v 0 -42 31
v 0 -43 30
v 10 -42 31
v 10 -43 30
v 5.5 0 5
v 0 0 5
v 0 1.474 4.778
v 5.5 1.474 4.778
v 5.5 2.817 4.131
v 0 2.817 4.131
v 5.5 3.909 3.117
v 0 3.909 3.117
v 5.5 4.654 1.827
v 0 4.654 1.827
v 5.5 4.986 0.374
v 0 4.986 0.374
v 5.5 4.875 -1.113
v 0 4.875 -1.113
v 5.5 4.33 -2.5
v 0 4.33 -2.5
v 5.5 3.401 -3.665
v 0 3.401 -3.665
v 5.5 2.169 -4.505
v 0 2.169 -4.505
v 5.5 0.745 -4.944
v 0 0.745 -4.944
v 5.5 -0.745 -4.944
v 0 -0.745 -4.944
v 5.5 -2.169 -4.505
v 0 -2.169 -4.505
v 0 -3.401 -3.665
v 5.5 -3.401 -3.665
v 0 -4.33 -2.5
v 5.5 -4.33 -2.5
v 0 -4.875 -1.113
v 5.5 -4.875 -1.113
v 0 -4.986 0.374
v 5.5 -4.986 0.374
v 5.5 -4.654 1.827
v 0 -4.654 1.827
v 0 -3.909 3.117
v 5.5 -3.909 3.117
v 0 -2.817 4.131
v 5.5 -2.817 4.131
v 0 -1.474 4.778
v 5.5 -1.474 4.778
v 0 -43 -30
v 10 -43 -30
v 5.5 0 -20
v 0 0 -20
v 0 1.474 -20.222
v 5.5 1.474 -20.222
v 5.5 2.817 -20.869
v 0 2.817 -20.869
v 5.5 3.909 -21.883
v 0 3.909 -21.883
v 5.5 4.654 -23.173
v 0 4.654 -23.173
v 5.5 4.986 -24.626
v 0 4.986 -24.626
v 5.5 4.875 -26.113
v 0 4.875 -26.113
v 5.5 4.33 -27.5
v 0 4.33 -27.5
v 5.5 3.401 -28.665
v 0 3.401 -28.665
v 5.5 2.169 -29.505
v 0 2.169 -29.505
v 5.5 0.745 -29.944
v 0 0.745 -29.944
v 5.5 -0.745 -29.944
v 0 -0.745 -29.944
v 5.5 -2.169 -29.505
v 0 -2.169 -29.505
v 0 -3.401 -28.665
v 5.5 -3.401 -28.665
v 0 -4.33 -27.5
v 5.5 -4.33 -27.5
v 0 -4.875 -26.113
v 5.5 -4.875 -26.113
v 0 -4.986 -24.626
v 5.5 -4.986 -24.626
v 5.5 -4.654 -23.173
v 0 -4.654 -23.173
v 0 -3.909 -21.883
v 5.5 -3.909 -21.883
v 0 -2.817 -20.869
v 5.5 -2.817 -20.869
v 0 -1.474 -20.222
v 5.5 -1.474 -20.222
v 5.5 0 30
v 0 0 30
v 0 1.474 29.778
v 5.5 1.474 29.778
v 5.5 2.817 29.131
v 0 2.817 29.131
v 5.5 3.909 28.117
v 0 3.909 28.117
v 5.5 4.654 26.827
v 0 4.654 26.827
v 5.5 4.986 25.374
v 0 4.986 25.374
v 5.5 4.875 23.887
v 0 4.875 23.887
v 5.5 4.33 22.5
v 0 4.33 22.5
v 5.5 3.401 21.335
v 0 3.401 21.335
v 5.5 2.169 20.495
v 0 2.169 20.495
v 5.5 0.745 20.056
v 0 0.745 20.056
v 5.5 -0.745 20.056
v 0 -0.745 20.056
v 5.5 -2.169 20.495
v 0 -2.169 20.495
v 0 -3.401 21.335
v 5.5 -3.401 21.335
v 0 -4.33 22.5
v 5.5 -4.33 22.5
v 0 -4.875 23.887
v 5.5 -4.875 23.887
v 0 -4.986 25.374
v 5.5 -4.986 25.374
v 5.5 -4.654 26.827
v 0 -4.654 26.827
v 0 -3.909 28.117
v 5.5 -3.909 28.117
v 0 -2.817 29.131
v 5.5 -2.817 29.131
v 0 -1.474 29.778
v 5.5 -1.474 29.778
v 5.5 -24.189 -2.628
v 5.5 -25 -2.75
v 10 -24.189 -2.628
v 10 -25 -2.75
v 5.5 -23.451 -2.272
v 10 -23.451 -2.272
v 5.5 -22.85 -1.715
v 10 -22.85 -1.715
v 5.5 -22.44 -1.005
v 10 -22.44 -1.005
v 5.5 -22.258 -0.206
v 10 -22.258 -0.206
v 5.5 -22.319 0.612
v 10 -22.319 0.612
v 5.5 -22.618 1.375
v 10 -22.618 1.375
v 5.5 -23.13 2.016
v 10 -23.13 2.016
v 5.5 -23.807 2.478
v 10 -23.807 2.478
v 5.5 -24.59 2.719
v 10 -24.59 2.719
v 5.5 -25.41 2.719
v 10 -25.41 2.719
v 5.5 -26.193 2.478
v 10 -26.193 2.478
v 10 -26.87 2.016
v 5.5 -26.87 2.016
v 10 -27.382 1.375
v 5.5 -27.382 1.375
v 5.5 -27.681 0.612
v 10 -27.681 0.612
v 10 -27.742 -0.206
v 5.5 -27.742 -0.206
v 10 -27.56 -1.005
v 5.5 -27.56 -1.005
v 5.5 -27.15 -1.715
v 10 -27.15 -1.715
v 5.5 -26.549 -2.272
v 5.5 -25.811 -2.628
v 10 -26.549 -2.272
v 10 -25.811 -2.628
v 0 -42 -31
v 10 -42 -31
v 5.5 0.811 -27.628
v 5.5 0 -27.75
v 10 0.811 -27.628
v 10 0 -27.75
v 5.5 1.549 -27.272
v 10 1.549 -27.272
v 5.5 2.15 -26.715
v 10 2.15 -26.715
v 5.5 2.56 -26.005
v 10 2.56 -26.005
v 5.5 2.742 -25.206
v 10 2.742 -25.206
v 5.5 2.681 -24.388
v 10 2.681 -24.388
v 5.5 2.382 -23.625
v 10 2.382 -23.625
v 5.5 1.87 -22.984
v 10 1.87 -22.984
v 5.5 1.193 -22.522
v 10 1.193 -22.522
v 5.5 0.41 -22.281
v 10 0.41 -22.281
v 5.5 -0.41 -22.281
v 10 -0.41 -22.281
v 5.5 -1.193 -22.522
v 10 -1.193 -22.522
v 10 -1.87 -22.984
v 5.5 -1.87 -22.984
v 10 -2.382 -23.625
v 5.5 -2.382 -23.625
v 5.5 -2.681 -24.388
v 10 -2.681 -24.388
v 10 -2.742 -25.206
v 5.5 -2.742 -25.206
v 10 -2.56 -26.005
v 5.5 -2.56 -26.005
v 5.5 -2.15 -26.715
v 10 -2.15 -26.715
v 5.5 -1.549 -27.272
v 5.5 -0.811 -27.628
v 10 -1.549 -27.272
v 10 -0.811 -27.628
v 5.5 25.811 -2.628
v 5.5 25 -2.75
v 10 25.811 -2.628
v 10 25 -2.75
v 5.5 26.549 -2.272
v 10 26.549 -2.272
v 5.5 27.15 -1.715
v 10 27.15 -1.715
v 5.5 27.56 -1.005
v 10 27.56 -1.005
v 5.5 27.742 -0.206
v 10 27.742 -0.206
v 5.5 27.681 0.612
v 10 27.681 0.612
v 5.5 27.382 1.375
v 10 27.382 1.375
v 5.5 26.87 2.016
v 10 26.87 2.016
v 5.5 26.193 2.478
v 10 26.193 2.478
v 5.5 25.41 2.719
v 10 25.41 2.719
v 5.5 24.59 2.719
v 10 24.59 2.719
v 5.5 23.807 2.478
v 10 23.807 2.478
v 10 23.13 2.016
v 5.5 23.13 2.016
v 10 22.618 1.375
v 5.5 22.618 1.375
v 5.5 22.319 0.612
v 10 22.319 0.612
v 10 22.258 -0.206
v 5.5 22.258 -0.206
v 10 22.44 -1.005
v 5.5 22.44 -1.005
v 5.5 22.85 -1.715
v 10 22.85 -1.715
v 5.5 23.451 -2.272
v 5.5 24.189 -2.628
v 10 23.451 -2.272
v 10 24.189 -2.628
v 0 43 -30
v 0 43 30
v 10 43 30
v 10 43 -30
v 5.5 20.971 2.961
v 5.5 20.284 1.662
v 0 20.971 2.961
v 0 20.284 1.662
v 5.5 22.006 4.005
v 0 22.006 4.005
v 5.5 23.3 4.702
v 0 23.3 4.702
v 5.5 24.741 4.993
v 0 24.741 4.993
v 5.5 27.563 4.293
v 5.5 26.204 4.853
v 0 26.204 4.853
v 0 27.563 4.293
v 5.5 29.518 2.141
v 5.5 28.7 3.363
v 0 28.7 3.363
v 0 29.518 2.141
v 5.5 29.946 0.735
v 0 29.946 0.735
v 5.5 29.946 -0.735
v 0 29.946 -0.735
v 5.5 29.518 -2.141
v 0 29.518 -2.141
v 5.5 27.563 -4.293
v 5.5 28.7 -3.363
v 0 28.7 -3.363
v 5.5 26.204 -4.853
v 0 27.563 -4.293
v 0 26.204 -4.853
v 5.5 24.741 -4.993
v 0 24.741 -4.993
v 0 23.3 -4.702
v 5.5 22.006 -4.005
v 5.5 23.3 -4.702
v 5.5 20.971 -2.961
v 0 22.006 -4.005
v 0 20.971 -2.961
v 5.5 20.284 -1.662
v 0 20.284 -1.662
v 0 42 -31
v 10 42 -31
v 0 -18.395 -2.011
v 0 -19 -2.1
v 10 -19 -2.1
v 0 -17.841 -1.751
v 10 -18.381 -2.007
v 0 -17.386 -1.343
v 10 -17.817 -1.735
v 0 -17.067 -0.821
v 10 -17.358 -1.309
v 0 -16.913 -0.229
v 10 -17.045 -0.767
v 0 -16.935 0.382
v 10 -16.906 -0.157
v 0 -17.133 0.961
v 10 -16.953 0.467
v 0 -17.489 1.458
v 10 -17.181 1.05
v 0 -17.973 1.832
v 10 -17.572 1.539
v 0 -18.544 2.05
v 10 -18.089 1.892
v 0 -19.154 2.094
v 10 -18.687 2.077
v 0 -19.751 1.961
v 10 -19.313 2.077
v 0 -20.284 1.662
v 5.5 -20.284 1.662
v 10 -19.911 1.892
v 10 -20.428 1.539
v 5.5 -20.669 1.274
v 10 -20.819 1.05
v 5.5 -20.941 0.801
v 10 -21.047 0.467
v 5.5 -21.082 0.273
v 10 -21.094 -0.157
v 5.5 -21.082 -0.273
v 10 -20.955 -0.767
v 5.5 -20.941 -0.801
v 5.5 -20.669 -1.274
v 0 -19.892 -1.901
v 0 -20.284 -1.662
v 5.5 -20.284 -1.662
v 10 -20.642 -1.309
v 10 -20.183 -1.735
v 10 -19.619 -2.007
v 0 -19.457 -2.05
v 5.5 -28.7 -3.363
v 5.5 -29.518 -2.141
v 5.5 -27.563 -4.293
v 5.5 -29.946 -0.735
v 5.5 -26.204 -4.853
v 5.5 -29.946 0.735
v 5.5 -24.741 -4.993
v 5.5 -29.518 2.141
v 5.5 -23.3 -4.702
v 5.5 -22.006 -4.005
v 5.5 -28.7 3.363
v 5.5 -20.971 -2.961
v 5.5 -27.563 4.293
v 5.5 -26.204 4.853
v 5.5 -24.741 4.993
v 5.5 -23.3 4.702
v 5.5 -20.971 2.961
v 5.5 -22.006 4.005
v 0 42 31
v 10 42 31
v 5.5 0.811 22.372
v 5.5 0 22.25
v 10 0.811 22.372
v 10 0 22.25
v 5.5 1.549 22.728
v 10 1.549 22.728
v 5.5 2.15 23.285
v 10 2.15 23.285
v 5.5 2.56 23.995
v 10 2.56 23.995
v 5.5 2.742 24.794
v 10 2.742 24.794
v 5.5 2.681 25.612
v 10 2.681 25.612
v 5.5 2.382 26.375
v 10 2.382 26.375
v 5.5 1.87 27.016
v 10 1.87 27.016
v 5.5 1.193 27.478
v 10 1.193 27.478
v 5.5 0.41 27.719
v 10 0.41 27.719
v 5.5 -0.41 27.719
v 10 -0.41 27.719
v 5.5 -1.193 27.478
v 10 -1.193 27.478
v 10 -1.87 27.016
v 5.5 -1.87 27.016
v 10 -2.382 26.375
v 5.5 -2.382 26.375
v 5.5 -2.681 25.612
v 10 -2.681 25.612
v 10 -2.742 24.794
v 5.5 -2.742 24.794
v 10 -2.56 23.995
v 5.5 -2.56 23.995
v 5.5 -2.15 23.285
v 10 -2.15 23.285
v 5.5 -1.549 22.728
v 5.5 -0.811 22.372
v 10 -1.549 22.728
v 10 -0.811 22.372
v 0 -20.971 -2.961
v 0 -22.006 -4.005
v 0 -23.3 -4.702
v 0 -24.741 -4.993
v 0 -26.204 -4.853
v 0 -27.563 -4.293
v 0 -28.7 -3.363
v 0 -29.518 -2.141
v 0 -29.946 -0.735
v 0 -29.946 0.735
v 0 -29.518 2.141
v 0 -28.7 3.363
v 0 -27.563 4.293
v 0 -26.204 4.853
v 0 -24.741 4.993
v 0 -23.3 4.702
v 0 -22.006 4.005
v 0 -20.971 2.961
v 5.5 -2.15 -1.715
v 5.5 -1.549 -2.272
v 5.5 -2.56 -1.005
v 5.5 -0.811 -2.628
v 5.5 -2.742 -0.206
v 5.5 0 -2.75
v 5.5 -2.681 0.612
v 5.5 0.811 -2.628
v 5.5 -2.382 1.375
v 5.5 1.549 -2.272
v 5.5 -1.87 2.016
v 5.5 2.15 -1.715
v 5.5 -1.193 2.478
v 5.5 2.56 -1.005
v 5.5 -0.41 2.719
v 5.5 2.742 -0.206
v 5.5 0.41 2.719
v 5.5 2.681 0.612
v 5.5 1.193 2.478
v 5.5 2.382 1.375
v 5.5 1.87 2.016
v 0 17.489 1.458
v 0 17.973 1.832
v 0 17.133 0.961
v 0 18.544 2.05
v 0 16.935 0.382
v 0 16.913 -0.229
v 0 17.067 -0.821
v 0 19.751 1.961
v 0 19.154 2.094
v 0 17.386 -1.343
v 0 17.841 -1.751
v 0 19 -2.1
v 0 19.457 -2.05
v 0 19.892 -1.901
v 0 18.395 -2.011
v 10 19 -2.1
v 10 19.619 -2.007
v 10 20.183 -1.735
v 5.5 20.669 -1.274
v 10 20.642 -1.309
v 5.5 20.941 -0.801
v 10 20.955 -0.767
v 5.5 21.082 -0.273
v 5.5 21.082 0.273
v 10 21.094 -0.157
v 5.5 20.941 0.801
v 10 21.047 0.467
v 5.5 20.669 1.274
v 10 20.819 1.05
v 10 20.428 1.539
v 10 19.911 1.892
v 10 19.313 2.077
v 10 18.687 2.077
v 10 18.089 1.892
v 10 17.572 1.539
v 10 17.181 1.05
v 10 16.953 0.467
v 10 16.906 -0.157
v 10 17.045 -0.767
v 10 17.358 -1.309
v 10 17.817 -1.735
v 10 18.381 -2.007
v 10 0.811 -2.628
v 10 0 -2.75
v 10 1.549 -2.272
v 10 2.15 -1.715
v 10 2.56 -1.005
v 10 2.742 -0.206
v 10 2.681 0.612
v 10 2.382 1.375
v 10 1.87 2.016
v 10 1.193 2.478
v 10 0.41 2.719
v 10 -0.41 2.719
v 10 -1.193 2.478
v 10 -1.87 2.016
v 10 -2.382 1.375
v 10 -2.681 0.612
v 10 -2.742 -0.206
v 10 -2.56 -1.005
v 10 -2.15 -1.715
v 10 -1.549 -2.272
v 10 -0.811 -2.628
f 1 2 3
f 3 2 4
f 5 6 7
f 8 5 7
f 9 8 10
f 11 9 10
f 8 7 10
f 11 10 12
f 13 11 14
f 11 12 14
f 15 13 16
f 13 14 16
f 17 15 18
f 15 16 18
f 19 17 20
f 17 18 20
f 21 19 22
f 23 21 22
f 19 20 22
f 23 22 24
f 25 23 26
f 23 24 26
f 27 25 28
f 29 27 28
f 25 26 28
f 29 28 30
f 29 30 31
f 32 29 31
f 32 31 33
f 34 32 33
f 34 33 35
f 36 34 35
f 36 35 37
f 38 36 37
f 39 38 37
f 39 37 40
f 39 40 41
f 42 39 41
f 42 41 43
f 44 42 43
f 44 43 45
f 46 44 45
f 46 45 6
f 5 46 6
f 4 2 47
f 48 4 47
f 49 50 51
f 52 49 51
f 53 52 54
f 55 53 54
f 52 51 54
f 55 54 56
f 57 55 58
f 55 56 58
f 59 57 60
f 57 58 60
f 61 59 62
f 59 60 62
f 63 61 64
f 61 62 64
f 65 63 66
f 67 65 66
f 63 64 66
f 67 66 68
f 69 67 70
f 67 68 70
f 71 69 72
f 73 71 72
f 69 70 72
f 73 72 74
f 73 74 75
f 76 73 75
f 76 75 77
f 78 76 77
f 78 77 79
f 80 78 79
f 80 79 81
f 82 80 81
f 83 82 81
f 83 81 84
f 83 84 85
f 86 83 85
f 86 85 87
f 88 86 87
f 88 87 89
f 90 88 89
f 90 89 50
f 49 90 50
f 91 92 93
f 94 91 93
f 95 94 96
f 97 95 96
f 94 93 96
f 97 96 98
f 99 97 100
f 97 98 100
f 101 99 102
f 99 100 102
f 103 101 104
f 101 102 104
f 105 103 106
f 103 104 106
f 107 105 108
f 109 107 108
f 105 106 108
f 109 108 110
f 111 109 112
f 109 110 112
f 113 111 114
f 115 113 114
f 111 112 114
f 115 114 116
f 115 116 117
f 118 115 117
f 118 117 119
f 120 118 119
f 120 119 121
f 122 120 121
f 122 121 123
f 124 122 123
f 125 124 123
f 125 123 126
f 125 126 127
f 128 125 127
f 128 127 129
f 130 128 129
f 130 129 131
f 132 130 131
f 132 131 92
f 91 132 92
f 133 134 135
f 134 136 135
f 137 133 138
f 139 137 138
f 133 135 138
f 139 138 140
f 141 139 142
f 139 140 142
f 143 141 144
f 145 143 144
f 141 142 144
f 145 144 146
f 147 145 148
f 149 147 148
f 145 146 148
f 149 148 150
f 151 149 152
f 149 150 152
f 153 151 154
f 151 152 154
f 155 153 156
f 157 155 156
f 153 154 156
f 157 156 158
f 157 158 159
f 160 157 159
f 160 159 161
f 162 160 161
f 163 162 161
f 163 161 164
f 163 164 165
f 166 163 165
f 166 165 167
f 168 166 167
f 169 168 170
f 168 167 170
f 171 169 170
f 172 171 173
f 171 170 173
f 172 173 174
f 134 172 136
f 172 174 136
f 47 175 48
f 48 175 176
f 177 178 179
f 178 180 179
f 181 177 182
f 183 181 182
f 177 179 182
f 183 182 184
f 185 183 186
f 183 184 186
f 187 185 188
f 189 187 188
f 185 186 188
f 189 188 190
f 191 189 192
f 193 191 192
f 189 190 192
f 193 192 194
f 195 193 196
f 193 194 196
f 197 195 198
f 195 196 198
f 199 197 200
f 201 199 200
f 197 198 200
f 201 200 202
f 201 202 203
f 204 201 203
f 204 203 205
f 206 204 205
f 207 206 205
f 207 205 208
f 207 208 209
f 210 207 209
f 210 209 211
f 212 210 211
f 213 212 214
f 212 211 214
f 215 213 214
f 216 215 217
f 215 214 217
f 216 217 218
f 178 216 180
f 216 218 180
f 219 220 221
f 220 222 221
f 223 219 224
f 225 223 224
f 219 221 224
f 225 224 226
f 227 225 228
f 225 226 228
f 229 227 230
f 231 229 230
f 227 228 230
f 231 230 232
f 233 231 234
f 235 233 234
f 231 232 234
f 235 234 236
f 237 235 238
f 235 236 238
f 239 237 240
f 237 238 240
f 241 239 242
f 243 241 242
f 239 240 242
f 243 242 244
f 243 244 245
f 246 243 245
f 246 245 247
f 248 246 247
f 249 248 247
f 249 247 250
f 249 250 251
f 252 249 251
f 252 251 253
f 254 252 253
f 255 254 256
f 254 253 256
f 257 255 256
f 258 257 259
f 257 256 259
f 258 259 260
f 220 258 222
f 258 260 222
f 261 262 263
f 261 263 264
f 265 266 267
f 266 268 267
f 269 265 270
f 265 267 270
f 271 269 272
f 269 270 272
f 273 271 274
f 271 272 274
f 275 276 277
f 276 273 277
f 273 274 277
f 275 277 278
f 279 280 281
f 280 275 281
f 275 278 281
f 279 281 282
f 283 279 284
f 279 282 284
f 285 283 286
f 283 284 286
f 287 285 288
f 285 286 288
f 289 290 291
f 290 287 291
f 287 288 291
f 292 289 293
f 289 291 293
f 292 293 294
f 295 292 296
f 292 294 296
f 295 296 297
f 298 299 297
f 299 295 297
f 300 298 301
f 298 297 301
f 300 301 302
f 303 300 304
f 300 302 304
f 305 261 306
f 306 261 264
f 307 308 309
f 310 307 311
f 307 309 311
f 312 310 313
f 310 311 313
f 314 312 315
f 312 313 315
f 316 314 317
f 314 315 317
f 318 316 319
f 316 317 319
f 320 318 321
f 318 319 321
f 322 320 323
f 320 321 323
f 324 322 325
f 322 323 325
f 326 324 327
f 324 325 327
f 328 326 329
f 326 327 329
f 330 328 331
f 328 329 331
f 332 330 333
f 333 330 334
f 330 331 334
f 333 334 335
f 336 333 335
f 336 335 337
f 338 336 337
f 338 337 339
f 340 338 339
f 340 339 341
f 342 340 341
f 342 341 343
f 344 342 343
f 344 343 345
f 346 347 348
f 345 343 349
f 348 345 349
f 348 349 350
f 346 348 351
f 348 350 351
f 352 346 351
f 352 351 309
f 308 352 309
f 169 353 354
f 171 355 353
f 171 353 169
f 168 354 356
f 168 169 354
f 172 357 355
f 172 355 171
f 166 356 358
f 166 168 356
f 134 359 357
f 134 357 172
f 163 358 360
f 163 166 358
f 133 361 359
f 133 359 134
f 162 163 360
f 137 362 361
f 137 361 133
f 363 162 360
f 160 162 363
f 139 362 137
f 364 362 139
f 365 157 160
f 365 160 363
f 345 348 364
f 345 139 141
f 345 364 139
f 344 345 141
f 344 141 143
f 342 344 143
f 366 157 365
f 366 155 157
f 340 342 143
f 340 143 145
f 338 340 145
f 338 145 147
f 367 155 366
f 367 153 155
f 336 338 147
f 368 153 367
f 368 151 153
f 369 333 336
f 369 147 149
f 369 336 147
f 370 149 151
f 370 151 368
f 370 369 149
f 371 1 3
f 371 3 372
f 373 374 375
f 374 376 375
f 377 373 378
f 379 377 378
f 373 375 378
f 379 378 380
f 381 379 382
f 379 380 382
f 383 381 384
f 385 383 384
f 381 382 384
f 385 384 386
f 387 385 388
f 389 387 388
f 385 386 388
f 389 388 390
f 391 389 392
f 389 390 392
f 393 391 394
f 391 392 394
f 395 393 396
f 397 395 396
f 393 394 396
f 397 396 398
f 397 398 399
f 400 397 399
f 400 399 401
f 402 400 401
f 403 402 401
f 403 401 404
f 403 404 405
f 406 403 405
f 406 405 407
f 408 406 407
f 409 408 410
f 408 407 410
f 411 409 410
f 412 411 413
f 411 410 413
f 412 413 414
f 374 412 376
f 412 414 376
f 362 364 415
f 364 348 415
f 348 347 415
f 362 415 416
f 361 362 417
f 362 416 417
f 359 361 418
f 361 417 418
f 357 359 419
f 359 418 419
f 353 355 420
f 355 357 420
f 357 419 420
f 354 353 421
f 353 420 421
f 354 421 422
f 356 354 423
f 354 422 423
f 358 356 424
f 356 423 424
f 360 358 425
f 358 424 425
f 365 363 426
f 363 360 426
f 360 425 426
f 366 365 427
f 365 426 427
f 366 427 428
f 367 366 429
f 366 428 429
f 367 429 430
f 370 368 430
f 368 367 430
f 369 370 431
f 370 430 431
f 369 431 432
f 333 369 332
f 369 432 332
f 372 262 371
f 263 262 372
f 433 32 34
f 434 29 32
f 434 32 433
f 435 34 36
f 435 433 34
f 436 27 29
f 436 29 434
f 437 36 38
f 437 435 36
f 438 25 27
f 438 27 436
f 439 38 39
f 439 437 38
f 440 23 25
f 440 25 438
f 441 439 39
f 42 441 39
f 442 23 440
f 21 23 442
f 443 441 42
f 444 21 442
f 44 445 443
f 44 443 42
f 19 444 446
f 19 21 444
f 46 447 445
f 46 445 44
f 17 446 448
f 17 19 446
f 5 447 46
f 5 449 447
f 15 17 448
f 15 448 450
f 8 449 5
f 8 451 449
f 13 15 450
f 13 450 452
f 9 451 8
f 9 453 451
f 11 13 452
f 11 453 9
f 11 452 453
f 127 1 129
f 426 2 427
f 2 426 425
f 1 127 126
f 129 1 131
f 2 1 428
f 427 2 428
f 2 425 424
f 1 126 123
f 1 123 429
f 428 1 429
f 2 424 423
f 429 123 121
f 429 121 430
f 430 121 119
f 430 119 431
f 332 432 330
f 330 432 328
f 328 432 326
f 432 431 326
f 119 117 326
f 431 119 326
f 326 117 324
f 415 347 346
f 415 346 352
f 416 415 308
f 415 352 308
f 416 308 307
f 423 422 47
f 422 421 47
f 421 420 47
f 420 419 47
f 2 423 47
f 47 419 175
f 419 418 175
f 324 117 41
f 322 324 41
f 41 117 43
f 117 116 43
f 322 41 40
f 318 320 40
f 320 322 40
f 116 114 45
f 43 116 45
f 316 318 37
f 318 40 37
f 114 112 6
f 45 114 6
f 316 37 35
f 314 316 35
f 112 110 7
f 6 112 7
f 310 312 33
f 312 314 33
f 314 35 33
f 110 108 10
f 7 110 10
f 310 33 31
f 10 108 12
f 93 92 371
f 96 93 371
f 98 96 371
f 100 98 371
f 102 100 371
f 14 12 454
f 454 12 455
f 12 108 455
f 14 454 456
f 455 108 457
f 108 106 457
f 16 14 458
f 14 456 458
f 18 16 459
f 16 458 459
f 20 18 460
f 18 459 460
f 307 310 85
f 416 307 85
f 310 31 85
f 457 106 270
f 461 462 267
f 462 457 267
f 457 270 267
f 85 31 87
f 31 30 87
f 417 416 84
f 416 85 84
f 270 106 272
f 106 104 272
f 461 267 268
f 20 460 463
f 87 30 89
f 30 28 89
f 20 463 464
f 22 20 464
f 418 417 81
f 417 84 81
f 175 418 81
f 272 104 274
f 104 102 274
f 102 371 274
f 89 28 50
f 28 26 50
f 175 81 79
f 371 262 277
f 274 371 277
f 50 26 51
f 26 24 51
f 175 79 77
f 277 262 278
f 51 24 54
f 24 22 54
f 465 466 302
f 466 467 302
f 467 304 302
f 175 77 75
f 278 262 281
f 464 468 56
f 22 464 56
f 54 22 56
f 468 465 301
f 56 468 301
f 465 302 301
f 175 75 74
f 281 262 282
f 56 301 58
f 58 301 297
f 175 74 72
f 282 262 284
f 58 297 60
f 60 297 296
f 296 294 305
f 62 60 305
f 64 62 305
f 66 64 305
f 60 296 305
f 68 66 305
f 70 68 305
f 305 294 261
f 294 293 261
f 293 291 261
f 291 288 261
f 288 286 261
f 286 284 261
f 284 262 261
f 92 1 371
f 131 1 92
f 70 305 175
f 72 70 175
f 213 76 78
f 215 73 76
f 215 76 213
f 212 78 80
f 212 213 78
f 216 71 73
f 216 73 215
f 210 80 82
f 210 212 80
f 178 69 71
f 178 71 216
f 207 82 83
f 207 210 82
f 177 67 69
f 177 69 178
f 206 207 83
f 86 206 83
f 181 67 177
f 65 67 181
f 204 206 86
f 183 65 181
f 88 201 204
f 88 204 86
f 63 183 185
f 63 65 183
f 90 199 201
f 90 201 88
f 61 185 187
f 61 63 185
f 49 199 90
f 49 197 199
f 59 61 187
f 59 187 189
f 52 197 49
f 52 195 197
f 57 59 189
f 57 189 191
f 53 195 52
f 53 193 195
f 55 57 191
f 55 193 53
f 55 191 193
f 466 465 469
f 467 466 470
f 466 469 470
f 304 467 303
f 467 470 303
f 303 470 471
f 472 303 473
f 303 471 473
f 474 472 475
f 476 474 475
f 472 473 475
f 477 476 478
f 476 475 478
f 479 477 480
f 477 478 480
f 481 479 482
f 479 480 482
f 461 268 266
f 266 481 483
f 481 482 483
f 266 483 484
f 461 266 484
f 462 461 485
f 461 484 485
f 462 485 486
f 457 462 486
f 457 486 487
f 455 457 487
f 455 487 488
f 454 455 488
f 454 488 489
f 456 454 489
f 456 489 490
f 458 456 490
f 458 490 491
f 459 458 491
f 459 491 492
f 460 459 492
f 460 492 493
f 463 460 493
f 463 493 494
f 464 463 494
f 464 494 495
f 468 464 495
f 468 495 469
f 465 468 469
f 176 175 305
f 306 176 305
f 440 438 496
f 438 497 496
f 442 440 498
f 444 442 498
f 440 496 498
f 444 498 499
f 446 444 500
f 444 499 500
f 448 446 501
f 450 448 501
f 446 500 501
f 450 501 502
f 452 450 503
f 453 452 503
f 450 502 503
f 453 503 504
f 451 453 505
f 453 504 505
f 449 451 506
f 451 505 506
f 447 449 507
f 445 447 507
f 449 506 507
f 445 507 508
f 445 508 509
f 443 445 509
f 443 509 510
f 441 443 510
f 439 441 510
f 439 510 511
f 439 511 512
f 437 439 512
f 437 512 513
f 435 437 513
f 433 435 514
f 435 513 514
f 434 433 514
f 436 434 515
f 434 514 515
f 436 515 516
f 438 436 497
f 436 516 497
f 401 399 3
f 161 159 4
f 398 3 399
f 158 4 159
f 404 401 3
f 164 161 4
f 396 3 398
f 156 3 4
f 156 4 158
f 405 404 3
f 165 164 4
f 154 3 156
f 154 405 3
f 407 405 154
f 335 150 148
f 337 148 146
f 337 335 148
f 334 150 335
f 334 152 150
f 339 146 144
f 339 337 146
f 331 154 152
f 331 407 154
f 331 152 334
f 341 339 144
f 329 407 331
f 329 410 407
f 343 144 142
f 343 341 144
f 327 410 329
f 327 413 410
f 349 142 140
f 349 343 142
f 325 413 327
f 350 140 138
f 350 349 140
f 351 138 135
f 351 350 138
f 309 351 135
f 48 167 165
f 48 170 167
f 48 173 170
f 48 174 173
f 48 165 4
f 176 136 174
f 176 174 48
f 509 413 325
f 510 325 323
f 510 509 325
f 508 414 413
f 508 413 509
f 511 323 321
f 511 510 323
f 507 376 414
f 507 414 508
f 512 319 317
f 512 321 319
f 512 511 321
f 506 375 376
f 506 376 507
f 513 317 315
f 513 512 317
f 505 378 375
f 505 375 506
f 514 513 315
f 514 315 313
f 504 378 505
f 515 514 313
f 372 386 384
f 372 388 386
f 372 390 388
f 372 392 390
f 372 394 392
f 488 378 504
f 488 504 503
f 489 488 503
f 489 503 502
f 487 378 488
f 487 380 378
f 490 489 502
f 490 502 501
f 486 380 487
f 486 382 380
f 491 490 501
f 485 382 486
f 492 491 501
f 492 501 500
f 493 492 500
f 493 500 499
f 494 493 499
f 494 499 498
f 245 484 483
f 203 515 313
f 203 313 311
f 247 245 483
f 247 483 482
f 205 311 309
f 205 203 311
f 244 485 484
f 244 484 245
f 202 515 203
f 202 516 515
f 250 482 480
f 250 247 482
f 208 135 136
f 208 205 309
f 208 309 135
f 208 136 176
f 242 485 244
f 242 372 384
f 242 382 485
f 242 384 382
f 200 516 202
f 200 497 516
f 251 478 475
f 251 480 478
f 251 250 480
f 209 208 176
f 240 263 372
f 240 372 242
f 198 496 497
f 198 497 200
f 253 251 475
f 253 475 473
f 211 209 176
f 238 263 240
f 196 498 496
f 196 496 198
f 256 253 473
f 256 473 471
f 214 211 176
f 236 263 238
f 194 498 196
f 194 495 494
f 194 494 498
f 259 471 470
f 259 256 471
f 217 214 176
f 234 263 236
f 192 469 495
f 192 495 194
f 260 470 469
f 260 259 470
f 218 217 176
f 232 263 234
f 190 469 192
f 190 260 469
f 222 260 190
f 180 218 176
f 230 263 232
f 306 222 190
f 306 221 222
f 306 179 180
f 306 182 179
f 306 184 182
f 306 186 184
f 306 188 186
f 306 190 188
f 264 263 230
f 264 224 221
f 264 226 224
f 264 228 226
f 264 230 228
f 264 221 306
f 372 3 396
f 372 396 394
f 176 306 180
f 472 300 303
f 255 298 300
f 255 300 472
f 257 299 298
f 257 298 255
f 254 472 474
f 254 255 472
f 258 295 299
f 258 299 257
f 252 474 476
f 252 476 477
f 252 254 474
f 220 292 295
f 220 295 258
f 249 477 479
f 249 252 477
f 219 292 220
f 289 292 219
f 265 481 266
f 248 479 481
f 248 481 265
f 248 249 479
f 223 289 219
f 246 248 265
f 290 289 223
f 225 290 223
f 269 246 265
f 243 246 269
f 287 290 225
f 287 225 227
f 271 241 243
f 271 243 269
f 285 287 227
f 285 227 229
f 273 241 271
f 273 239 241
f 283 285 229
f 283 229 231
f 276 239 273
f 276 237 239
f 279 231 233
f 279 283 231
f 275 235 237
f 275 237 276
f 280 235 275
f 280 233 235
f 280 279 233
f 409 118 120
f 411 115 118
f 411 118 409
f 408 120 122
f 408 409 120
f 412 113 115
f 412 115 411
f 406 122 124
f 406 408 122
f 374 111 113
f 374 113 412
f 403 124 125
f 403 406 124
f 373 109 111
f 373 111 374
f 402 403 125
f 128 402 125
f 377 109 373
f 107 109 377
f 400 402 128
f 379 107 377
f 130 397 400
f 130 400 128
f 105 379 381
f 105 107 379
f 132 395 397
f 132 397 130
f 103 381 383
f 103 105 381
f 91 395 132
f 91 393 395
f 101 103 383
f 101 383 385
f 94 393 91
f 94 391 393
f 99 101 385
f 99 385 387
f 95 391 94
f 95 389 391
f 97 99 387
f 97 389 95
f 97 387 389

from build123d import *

# Parameters (mm, degrees)
SKETCH_1_W                = 62
SKETCH_1_H                = 86
EXTRUDE_1_DEPTH           = 10
CHAMFER_1_SIZE            = 1
HOLE_WIZARD_1_D           = 5.5
HOLE_WIZARD_1_CBORE_D     = 10
HOLE_WIZARD_1_CBORE_DEPTH = 5.5
HOLE_WIZARD_M5_1_D        = 4.2


with BuildPart() as part:
    # 草图1 → 凸台-拉伸1 (new body)
    with BuildSketch(Plane(origin=(0, 0, 0), x_dir=(0, 0, -1), z_dir=(1, 0, 0))):
        Rectangle(SKETCH_1_W, SKETCH_1_H)
    extrude(amount=EXTRUDE_1_DEPTH)

    # 倒角1
    chamfer_1_edges = [part.edges().sort_by_distance(p)[0] for p in [
        (5, 43, 31),
        (5, 43, -31),
        (5, -43, -31),
        (5, -43, 31),
    ]]
    chamfer(chamfer_1_edges, length=CHAMFER_1_SIZE)

    # 打孔尺寸(%根据)内六角圆柱头螺钉的类型1 (through all)
    with Locations(Plane.ZY):
        with Locations((25, 0), (0, -25), (-25, 0), (0, 25), (0, 0)):
            CounterBoreHole(HOLE_WIZARD_1_D / 2, HOLE_WIZARD_1_CBORE_D / 2, HOLE_WIZARD_1_CBORE_DEPTH)

    # M5 螺纹孔1 (through all)
    with Locations(Plane.ZY):
        with Locations((0, 19), (0, -19)):
            Hole(HOLE_WIZARD_M5_1_D / 2)


solid = part.part
